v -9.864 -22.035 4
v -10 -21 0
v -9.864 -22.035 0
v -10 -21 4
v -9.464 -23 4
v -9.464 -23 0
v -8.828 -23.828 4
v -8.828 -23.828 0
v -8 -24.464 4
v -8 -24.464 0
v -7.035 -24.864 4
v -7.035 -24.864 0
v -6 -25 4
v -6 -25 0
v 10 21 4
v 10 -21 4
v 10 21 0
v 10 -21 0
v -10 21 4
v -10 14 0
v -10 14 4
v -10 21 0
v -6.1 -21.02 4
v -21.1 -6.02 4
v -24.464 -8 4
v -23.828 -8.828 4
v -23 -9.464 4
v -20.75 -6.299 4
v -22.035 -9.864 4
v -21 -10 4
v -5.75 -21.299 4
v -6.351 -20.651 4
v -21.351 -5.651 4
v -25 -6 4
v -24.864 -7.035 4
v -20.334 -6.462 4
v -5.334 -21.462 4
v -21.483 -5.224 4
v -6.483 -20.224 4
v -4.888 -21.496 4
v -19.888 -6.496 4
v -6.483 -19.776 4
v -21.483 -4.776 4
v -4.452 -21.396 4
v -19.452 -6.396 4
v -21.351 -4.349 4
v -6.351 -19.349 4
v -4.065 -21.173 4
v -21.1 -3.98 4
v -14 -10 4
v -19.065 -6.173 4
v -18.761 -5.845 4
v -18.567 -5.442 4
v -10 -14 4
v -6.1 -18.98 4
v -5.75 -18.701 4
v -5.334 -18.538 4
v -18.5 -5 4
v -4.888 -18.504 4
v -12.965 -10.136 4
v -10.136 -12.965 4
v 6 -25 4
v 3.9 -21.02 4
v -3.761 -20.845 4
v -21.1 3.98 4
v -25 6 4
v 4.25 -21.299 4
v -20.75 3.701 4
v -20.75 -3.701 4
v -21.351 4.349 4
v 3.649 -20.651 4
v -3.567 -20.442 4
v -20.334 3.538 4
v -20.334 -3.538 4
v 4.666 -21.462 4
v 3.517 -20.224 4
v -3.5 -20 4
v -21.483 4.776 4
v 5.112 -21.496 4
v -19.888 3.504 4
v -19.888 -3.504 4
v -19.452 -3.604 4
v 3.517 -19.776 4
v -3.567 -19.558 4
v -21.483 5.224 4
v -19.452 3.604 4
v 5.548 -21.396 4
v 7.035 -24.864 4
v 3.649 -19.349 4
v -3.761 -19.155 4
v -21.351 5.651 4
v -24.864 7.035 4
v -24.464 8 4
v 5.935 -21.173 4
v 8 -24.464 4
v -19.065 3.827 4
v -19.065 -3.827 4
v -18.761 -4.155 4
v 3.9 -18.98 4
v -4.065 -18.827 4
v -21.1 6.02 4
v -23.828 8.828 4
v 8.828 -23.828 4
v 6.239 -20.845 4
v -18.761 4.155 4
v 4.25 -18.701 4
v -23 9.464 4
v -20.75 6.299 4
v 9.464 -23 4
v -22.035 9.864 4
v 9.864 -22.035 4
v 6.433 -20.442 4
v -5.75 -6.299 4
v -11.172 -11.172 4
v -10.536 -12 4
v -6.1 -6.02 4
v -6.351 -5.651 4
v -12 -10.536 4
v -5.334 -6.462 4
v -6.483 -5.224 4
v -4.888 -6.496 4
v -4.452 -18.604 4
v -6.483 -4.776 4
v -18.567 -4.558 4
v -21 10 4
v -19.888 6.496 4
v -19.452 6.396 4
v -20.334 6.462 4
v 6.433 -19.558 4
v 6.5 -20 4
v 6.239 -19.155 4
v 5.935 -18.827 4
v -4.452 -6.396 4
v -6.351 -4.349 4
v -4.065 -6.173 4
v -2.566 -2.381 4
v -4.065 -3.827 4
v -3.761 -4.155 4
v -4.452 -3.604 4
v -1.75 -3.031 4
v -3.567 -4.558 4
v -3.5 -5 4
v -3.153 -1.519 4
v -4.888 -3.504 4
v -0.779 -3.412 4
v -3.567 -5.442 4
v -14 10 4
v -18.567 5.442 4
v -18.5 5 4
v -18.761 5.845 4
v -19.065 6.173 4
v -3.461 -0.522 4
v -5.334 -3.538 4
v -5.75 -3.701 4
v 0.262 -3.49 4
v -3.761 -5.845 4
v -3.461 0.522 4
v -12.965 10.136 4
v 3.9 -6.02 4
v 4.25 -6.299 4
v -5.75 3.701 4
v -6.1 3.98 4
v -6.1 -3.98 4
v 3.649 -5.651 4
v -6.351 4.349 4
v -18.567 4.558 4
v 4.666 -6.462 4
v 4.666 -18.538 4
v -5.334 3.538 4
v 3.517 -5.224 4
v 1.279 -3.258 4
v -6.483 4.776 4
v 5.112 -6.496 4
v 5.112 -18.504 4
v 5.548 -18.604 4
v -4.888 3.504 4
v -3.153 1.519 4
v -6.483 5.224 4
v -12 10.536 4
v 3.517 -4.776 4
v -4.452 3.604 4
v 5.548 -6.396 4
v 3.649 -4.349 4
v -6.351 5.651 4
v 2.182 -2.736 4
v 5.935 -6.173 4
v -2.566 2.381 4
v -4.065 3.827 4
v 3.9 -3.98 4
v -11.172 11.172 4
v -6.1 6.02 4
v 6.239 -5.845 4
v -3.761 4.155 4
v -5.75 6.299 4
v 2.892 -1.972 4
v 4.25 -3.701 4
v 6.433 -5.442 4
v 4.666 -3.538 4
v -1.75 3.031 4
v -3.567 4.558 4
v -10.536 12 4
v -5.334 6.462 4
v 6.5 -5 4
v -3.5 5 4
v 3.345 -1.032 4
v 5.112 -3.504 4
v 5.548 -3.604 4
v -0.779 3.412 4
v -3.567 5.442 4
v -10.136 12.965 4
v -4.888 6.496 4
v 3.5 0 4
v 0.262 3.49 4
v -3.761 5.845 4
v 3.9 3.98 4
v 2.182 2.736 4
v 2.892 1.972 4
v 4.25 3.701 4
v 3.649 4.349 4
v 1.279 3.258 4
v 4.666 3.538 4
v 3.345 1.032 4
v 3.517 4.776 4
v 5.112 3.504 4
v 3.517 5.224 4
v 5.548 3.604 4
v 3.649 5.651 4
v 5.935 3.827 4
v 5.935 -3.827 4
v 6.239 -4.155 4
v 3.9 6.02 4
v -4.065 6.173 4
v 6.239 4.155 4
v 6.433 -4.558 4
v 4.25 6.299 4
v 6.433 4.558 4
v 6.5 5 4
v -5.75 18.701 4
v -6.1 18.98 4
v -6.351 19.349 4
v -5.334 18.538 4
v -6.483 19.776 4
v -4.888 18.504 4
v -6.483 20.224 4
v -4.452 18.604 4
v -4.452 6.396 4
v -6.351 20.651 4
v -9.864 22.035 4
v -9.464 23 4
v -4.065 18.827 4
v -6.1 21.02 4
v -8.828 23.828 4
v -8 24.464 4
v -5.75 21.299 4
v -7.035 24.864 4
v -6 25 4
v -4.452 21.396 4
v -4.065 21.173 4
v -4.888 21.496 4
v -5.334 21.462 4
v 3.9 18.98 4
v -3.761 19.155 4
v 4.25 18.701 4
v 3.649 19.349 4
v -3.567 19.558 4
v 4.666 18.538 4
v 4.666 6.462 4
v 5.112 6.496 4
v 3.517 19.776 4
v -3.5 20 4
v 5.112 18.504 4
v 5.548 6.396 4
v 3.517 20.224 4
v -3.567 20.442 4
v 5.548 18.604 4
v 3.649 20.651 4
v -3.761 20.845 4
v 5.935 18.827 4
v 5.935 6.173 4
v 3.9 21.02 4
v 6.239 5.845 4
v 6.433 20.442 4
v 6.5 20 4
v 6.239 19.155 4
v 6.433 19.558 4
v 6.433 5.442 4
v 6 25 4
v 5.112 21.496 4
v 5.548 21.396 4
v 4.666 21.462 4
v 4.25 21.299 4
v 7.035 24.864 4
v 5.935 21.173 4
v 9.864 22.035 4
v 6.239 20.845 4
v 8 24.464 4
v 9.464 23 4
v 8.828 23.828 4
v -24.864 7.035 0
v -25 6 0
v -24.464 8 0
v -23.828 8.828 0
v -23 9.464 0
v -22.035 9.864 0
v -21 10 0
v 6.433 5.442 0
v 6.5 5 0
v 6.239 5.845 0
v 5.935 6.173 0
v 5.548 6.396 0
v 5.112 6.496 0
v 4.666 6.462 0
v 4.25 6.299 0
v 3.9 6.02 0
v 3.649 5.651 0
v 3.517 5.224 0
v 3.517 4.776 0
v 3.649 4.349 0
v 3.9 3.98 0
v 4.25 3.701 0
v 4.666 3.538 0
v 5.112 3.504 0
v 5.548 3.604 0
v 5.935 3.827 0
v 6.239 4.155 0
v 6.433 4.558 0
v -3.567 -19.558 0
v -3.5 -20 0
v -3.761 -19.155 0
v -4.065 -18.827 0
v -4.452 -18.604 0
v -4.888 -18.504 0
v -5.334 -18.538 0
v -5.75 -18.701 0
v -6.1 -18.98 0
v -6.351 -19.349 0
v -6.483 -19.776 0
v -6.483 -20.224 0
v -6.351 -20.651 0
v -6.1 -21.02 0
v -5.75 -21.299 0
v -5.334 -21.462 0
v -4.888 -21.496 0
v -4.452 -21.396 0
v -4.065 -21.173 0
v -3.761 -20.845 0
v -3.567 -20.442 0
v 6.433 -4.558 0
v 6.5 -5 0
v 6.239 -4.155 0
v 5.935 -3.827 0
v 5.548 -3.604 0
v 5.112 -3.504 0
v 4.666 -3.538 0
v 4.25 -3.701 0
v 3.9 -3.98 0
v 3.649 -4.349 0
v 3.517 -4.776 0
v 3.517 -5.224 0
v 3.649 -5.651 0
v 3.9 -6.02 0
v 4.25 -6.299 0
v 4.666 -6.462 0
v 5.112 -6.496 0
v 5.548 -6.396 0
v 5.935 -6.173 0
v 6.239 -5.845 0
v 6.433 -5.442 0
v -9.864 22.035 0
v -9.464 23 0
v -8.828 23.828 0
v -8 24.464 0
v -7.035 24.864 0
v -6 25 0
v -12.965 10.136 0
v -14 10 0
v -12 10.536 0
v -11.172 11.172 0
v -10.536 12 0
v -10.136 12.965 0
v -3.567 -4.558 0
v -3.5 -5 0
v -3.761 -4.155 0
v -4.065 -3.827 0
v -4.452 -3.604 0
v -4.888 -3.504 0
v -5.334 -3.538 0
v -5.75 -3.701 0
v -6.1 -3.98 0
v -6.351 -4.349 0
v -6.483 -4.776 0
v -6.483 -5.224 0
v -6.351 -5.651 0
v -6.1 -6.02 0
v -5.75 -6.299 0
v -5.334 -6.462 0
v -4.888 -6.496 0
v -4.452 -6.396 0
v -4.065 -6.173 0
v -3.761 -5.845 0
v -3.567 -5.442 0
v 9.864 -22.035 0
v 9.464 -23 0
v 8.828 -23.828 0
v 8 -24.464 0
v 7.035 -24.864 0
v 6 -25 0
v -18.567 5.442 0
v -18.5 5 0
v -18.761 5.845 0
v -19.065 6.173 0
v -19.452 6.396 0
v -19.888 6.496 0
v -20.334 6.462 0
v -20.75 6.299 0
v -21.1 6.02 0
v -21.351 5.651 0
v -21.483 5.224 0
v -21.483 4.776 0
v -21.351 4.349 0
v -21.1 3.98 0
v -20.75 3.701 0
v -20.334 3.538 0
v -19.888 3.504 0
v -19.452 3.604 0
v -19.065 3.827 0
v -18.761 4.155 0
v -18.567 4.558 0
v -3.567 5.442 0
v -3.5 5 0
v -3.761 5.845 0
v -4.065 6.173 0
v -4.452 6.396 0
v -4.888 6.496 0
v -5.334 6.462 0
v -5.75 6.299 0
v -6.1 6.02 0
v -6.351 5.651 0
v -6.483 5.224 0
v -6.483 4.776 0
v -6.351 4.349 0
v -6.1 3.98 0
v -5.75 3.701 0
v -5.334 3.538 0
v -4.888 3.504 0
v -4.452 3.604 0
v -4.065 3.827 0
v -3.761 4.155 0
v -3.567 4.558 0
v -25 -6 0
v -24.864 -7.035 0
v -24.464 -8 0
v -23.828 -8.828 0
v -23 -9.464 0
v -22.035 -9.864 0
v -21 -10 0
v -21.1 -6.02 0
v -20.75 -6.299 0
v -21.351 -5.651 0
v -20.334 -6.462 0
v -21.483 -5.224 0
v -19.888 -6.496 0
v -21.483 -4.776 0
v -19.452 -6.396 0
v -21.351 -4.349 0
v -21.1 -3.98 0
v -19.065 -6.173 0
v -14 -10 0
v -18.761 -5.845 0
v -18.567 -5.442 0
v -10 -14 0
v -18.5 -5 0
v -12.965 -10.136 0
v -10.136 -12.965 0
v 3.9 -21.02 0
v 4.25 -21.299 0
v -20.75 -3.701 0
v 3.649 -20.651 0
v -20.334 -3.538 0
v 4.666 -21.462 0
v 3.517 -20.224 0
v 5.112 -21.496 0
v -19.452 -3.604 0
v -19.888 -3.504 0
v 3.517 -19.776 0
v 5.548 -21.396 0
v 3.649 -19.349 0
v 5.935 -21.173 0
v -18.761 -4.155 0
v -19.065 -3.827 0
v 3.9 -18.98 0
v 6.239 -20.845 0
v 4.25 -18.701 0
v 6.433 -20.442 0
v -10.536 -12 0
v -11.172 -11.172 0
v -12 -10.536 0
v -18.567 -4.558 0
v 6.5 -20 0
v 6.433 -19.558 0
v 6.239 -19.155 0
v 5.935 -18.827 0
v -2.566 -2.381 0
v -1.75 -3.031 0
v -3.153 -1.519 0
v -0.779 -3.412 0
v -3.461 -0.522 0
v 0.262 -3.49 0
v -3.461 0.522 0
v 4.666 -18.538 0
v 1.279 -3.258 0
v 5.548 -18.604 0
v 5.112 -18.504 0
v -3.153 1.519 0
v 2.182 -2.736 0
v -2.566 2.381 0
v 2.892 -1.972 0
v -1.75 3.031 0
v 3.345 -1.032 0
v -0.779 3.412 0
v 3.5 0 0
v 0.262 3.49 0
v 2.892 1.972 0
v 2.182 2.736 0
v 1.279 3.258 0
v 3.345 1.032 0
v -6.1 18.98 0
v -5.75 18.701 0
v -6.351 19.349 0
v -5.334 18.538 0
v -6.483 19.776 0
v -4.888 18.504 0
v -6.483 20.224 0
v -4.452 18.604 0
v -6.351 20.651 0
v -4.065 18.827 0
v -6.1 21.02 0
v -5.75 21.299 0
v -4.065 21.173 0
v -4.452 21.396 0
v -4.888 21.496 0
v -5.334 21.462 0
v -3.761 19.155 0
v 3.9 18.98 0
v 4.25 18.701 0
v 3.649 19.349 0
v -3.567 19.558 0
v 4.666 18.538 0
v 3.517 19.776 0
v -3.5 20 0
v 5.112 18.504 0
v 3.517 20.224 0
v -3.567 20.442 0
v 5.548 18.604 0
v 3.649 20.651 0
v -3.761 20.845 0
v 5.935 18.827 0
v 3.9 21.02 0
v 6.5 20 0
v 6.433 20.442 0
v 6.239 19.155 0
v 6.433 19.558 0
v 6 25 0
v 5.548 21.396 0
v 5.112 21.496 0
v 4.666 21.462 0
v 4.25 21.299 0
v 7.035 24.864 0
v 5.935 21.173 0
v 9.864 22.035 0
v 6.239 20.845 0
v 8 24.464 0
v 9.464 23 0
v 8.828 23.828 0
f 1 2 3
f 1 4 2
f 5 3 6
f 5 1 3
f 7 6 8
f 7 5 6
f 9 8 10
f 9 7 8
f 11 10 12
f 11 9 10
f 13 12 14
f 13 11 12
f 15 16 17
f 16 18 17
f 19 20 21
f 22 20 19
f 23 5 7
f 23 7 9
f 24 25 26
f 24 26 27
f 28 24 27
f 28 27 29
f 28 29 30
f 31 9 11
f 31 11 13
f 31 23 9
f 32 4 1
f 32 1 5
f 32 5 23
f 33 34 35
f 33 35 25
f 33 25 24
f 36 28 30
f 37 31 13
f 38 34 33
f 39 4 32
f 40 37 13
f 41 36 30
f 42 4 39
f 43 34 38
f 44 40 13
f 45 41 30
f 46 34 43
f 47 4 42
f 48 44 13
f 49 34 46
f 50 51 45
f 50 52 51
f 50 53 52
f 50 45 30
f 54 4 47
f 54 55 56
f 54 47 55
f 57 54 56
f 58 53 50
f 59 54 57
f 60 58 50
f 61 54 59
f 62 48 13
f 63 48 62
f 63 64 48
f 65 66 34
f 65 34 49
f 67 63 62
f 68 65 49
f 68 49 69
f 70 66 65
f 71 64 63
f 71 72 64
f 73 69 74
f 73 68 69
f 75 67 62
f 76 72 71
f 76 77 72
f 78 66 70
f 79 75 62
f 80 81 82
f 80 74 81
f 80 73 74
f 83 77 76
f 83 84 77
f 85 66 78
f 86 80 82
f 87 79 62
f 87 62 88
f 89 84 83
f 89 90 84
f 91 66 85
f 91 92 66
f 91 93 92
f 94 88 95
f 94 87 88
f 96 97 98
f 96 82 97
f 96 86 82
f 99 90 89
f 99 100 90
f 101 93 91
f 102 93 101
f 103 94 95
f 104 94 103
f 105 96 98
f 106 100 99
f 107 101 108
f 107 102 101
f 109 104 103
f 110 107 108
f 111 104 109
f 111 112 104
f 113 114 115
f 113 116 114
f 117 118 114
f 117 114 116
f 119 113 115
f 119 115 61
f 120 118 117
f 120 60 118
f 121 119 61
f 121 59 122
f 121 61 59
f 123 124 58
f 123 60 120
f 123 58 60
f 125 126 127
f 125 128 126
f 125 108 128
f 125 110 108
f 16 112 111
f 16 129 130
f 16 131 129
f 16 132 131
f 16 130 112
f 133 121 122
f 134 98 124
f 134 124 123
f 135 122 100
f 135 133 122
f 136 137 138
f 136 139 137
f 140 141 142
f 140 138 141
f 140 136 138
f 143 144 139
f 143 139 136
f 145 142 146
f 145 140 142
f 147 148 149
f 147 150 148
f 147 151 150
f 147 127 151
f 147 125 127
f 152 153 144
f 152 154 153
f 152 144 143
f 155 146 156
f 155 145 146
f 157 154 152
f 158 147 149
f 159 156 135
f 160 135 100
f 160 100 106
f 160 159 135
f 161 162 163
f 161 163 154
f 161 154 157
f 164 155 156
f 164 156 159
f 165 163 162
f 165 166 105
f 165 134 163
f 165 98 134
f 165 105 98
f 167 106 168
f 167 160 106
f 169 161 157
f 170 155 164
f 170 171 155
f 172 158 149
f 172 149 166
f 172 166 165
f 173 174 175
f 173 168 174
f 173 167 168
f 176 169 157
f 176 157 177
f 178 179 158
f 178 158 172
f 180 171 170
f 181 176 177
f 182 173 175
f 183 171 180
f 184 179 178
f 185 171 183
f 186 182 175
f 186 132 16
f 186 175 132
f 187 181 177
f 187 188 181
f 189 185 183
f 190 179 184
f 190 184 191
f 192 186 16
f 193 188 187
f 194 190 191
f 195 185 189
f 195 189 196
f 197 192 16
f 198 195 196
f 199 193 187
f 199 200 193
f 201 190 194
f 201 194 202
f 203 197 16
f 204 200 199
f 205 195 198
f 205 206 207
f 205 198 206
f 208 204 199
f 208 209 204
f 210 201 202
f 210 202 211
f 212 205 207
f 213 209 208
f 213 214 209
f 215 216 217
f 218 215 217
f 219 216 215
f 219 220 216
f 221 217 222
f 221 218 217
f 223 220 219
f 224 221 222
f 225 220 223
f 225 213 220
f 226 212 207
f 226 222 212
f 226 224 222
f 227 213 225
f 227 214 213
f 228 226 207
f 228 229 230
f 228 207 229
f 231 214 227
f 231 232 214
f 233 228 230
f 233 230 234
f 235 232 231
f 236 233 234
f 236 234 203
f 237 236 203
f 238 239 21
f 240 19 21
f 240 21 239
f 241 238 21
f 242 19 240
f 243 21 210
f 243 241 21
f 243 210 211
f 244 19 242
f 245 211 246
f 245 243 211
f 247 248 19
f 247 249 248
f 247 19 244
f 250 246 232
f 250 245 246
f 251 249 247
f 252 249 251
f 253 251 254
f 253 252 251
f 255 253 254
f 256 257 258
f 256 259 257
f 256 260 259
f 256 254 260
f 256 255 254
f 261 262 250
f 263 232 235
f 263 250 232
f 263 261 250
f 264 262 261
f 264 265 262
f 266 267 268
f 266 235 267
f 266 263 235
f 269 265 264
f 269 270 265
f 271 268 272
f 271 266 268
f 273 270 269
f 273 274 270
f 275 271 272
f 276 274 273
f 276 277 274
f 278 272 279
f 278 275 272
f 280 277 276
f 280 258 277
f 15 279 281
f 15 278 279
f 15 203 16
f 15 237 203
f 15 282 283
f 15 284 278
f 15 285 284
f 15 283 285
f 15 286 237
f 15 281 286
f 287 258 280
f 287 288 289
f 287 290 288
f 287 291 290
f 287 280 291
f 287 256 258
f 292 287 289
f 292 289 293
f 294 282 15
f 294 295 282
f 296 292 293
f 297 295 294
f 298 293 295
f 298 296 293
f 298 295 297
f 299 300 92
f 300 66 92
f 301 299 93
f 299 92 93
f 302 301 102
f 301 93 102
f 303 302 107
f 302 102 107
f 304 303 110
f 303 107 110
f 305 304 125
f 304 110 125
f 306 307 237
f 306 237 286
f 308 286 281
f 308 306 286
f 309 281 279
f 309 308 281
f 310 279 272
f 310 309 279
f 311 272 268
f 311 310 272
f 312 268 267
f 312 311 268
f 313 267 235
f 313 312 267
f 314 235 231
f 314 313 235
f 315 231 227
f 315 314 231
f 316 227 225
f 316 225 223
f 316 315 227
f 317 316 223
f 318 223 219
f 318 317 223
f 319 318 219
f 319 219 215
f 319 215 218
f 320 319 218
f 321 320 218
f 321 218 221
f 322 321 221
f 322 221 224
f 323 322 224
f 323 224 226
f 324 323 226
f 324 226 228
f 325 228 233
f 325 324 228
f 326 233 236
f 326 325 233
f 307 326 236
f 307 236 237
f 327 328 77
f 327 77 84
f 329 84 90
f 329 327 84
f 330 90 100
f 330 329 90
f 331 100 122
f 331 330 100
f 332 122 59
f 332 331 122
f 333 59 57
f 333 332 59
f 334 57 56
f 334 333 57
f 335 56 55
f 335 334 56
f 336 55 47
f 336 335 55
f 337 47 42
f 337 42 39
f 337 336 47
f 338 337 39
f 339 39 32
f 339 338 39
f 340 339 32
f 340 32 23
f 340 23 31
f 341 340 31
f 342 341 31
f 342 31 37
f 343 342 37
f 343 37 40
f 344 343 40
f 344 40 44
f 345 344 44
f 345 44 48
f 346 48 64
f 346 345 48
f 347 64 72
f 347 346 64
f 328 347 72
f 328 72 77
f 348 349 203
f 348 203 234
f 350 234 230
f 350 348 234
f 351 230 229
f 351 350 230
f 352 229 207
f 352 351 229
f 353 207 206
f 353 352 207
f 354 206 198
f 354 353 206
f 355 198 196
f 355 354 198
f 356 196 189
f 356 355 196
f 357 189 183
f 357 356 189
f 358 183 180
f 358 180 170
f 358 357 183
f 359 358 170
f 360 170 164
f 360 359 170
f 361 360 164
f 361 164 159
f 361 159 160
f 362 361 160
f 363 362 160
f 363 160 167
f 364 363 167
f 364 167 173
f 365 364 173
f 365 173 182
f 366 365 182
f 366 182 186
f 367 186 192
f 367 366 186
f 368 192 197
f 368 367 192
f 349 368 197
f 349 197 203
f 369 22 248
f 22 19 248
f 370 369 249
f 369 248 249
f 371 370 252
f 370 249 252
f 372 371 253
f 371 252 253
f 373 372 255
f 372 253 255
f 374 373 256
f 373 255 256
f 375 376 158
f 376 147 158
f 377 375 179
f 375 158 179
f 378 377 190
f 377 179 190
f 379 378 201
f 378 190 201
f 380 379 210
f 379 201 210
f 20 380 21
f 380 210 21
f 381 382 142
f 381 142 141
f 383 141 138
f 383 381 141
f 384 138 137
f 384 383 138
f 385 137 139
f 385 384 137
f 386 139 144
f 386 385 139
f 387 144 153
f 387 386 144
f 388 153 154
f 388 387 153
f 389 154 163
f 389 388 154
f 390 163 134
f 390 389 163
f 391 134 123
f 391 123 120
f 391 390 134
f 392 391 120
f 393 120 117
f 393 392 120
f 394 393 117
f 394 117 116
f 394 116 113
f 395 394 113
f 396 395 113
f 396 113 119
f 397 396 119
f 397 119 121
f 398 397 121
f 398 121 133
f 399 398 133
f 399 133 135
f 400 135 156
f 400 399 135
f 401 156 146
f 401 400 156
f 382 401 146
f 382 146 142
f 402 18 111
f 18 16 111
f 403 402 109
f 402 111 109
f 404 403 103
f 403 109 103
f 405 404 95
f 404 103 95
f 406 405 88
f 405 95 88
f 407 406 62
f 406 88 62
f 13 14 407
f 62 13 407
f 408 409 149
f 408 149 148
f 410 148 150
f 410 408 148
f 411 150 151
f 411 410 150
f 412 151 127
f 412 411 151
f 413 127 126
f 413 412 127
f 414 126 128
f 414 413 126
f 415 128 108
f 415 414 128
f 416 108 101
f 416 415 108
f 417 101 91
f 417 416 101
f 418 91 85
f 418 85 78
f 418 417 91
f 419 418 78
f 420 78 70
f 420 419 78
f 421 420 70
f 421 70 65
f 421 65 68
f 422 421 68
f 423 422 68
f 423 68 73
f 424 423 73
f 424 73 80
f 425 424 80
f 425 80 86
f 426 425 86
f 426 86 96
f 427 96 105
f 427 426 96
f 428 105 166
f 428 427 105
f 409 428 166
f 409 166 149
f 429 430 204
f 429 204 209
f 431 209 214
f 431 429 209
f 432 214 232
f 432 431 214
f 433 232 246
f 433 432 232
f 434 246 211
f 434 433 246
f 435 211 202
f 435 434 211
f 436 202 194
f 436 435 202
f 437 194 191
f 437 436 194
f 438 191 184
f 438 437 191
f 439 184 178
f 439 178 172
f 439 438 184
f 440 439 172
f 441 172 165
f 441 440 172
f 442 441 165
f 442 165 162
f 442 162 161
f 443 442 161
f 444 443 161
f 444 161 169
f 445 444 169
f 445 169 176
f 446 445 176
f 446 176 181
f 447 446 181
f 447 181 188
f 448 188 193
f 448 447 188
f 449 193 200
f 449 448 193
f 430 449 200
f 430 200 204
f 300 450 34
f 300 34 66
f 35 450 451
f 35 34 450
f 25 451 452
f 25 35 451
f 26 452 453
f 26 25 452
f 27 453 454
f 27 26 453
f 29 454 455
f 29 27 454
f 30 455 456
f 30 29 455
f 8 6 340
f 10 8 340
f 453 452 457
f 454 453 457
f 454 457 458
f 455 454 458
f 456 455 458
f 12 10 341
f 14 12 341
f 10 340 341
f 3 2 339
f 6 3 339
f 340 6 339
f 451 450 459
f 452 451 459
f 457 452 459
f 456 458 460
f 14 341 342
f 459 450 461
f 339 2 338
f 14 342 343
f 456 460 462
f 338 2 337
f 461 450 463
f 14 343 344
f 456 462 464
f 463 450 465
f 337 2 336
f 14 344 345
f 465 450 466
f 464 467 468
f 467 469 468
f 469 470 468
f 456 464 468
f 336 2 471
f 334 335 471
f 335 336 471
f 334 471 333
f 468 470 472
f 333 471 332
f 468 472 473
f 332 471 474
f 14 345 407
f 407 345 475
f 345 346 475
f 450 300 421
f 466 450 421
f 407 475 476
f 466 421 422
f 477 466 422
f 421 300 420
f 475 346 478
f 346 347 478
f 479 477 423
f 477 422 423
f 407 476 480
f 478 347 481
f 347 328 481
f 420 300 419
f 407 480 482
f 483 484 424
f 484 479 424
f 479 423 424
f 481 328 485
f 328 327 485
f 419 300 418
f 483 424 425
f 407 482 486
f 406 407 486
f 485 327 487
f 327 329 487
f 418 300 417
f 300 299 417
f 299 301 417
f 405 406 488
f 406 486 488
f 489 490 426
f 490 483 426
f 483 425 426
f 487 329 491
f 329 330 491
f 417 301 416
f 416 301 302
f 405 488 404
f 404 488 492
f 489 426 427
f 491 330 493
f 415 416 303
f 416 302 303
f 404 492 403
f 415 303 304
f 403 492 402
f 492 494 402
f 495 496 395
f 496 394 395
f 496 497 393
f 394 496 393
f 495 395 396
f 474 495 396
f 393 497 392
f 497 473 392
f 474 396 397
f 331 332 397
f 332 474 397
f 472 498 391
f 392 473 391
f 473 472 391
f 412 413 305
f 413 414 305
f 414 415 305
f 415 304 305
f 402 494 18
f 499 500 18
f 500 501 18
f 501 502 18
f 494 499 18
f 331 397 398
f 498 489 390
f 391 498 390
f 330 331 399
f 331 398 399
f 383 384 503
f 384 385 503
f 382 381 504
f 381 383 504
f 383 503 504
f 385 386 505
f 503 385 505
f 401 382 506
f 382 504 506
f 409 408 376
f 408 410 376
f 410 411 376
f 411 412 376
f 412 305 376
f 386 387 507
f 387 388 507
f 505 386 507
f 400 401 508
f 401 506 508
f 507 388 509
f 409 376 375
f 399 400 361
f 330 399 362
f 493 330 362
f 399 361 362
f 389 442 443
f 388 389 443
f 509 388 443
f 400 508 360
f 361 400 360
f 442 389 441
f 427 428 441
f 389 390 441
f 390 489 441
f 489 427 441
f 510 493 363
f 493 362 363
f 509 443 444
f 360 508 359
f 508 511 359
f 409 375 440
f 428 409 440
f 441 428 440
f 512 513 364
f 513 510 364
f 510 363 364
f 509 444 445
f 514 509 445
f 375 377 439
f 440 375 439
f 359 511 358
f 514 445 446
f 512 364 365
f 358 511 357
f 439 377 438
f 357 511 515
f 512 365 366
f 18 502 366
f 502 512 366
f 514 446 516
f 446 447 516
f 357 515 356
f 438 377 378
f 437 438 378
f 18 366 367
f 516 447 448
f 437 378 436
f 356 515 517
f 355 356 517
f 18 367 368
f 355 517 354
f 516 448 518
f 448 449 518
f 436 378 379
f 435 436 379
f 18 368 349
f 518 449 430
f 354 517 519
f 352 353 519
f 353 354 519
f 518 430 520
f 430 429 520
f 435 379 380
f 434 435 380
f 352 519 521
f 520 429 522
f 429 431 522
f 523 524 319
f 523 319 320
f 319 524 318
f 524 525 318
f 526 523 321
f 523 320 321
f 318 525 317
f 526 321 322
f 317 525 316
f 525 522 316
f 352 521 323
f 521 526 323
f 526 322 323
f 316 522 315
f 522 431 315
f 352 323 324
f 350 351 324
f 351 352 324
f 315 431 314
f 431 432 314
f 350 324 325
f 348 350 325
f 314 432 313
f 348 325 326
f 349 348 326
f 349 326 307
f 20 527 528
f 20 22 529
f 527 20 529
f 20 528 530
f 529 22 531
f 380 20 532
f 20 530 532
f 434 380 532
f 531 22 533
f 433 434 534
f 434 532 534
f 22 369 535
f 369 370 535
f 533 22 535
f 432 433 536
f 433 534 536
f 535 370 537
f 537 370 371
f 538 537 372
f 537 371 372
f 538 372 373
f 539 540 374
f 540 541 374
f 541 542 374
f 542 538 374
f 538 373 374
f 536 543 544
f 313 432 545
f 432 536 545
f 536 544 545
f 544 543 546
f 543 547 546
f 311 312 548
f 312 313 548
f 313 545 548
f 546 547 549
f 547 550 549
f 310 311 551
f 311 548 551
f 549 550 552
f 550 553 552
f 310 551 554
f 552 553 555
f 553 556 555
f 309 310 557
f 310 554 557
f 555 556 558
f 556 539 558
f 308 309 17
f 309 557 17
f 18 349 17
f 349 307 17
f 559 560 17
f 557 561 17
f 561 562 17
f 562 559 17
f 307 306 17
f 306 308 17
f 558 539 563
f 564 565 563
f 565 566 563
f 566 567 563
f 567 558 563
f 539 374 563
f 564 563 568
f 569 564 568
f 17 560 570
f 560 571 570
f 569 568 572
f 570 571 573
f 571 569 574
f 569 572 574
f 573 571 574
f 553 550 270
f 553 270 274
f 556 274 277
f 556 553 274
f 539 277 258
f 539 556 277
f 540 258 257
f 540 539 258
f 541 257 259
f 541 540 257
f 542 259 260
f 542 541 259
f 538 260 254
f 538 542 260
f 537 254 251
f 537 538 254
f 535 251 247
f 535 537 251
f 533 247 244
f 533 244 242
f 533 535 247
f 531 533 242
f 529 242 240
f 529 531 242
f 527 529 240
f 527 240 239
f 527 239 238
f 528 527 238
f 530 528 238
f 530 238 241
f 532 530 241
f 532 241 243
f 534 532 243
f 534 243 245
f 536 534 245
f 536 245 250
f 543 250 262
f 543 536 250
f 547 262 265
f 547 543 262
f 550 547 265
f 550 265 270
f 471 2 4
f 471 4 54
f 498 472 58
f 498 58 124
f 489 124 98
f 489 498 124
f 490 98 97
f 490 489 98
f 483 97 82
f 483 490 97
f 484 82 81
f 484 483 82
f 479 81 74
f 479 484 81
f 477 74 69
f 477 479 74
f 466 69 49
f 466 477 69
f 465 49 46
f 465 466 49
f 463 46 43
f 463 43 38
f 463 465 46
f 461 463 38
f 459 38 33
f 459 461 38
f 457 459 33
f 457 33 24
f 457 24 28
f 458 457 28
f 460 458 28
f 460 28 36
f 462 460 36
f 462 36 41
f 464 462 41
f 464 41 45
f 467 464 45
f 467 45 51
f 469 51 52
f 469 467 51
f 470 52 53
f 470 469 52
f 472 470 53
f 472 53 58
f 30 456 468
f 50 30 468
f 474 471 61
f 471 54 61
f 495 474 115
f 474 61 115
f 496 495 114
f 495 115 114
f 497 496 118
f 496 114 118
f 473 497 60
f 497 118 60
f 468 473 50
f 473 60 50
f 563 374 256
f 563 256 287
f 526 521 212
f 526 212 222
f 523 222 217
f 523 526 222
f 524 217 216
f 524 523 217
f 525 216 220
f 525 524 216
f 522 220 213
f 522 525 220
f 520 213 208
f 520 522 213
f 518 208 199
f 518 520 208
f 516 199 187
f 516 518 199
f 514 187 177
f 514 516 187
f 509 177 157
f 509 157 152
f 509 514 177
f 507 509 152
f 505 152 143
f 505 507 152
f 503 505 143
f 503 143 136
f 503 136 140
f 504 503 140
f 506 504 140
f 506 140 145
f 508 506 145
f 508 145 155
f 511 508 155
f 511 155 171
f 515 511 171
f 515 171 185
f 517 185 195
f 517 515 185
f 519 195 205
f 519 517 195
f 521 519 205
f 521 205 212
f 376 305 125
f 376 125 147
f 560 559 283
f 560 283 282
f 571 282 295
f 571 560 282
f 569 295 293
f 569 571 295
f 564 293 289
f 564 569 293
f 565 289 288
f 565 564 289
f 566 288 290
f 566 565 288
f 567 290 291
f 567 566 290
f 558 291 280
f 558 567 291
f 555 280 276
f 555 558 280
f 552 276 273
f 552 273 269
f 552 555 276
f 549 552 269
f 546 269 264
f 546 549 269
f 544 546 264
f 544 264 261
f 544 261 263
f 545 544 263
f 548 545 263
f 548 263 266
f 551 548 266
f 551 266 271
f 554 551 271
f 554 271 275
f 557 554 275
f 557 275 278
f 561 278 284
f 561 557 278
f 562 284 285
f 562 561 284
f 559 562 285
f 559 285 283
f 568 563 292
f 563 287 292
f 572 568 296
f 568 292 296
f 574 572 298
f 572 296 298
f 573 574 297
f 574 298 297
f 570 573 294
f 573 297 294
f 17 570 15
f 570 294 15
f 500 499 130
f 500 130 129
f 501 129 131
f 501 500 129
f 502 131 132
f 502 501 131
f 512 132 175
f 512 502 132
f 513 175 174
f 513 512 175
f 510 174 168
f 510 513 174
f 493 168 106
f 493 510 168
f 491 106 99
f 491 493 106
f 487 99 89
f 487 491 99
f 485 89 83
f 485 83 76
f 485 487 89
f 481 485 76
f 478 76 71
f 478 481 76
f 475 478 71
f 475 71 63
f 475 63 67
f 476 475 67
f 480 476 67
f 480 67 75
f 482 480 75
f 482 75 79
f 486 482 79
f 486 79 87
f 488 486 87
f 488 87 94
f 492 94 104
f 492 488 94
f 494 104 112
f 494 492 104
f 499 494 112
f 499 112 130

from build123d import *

# Parameters (mm, degrees)
SKETCH_1_W      = 15
SKETCH_1_H      = 20
SKETCH_1_R      = 1.5
SKETCH_1_W_2    = 20
SKETCH_1_R_2    = 3.5
SKETCH_1_H_2    = 15
EXTRUDE_1_DEPTH = 4
FILLET_1_R      = 4


with BuildPart() as part:
    # 草图1 → 凸台-拉伸1 (new body)
    # profile 1 of 4: a face of its own
    with BuildSketch(Plane.XY):
        with Locations((-17.5, 0)):
            Rectangle(SKETCH_1_W, SKETCH_1_H)
        with Locations((-20, -5)):
            Circle(SKETCH_1_R, mode=Mode.SUBTRACT)
        with Locations((-20, 5)):
            Circle(SKETCH_1_R, mode=Mode.SUBTRACT)
    # profile 2 of 4: a face of its own
    with BuildSketch(Plane.XY):
        Rectangle(SKETCH_1_W_2, SKETCH_1_H)
        with Locations((-5, -5)):
            Circle(SKETCH_1_R, mode=Mode.SUBTRACT)
        Circle(SKETCH_1_R_2, mode=Mode.SUBTRACT)
        with Locations((5, -5)):
            Circle(SKETCH_1_R, mode=Mode.SUBTRACT)
        with Locations((-5, 5)):
            Circle(SKETCH_1_R, mode=Mode.SUBTRACT)
        with Locations((5, 5)):
            Circle(SKETCH_1_R, mode=Mode.SUBTRACT)
    # profile 3 of 4: a face of its own
    with BuildSketch(Plane.XY):
        with Locations((0, 17.5)):
            Rectangle(SKETCH_1_W_2, SKETCH_1_H_2)
        with Locations((-5, 20)):
            Circle(SKETCH_1_R, mode=Mode.SUBTRACT)
        with Locations((5, 20)):
            Circle(SKETCH_1_R, mode=Mode.SUBTRACT)
    # profile 4 of 4: a face of its own
    with BuildSketch(Plane.XY):
        with Locations((0, -17.5)):
            Rectangle(SKETCH_1_W_2, SKETCH_1_H_2)
        with Locations((-5, -20)):
            Circle(SKETCH_1_R, mode=Mode.SUBTRACT)
        with Locations((5, -20)):
            Circle(SKETCH_1_R, mode=Mode.SUBTRACT)
    extrude(amount=EXTRUDE_1_DEPTH)

    # 圆角1
    fillet_1_edges = [part.edges().sort_by_distance(p)[0] for p in [
        (-25, -10, 2),
        (-25, 10, 2),
        (-10, 10, 2),
        (-10, 25, 2),
        (10, 25, 2),
        (10, -25, 2),
        (-10, -25, 2),
        (-10, -10, 2),
    ]]
    fillet(fillet_1_edges, radius=FILLET_1_R)


solid = part.part
